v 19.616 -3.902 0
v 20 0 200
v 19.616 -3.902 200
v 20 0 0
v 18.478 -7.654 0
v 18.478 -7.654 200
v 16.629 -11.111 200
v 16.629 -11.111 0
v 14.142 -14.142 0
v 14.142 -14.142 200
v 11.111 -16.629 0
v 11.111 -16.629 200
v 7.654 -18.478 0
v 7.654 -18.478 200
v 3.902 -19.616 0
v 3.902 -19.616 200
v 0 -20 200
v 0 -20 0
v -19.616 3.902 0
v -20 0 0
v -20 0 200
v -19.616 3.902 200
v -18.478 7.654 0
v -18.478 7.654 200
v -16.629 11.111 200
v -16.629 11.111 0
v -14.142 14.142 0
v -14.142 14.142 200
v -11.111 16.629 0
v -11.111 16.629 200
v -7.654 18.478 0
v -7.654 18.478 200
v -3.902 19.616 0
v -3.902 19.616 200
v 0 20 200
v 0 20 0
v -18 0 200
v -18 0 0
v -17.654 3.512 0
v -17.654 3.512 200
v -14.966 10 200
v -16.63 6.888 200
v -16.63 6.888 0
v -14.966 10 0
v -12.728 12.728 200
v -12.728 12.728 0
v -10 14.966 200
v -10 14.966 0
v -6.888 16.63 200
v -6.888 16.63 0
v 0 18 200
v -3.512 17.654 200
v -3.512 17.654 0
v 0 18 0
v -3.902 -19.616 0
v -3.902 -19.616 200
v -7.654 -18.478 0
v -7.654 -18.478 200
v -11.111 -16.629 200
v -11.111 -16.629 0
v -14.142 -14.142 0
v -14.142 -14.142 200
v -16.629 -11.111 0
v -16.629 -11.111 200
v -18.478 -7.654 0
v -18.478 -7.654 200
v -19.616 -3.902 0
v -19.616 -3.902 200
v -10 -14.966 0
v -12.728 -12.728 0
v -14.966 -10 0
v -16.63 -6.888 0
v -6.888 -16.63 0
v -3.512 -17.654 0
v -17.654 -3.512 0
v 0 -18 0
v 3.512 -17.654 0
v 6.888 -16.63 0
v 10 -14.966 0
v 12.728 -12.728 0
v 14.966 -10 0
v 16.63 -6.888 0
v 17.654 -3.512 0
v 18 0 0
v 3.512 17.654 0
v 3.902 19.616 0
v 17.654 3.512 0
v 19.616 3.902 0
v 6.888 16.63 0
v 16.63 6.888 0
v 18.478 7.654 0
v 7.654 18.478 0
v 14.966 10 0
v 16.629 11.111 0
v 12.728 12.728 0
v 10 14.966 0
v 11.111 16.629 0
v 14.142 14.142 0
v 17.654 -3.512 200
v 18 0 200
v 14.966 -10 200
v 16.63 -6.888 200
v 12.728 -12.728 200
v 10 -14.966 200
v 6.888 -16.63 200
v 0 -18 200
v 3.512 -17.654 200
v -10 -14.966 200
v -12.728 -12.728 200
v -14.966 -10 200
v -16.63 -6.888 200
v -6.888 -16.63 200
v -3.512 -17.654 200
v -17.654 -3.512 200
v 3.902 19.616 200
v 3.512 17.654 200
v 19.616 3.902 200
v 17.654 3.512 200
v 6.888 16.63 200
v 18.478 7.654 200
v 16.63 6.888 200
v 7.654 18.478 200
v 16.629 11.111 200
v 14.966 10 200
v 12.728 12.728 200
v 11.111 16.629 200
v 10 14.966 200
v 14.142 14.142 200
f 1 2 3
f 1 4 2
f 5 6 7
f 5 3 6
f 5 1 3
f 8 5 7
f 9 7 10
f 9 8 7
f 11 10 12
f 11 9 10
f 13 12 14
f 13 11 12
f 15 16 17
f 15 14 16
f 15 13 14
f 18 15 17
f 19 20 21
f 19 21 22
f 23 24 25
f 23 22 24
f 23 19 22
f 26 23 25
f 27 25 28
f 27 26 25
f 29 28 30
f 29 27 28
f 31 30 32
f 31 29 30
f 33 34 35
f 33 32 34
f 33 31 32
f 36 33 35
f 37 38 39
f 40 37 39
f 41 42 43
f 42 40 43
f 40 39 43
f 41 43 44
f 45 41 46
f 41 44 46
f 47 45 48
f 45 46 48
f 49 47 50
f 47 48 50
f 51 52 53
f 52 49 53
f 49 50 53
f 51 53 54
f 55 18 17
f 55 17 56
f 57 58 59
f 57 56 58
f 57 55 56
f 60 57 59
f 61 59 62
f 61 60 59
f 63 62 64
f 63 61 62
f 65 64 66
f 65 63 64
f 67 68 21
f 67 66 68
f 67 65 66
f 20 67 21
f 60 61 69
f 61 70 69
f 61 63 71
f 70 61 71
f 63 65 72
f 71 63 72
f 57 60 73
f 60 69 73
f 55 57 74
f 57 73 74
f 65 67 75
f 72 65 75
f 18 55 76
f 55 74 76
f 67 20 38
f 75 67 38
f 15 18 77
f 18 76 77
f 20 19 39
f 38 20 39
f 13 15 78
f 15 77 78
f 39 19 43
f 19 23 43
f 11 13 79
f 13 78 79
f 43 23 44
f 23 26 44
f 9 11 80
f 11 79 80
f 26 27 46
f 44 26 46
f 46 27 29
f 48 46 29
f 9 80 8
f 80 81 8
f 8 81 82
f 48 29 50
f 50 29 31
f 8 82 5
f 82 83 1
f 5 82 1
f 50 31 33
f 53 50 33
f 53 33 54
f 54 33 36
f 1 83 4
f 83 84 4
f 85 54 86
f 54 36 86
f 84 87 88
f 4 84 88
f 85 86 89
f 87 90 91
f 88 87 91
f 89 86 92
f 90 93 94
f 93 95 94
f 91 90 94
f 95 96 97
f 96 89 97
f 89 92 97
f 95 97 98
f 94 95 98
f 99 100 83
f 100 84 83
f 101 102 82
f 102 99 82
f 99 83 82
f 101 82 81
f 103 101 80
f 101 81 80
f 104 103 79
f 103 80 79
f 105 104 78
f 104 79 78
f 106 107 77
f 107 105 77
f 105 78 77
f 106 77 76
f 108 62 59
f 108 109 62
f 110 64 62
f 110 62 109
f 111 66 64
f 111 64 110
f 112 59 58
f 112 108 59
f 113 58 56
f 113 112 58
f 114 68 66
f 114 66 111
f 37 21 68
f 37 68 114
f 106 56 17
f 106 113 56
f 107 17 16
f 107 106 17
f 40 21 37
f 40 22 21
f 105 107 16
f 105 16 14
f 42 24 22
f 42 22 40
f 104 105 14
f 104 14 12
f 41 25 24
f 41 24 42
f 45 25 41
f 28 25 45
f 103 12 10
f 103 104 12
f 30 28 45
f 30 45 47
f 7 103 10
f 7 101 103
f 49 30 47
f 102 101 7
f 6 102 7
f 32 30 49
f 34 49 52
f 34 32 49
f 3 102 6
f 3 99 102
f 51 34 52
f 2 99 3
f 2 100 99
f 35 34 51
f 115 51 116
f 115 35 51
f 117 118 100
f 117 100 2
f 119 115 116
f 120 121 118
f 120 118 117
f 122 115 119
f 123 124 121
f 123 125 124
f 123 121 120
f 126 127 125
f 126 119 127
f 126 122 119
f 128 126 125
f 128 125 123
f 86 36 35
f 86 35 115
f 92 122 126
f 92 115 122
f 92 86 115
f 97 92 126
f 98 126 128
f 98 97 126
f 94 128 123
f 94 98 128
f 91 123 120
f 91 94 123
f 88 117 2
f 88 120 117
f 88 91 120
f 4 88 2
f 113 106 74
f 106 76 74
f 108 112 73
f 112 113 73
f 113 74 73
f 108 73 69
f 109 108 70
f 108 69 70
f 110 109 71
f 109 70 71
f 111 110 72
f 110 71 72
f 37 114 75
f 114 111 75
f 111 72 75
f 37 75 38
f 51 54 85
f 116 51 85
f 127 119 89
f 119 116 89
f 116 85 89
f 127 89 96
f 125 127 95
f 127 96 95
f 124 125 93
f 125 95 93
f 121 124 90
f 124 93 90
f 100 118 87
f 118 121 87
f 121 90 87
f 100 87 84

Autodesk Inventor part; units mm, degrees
ref_plane "YZ Plane" through (0, 0, 0) normal (1, 0, 0) x (0, 1, 0)
ref_plane "XZ Plane" through (0, 0, 0) normal (0, 1, 0) x (-1, 0, 0)
ref_plane "XY Plane" through (0, 0, 0) normal (0, 0, 1) x (1, 0, 0)
sketch "스케치1" plane through (0, 0, 0) normal (0, 0, 1) x (1, 0, 0)
  line L0 (0, 20) -> (0, 20)
  line L1 (20, 0) -> (20, 0)
  line L2 (0, -20) -> (0, -20)
  line L3 (-20, 0) -> (-20, 0)
  line L4 (0, 18) -> (0, 18)
  line L5 (-18, 0) -> (-18, 0)
  line L6 (0, -18) -> (0, -18)
  line L7 (18, 0) -> (18, 0)
  arc A0 (0, 18) -> (-18, 0) centre (0, 0) ccw
  arc A1 (-18, 0) -> (0, -18) centre (0, 0) ccw
  arc A2 (0, -18) -> (18, 0) centre (0, 0) ccw
  arc A3 (18, 0) -> (0, 18) centre (0, 0) ccw
  arc A4 (0, 20) -> (-20, 0) centre (0, 0) ccw
  arc A5 (-20, 0) -> (0, -20) centre (0, 0) ccw
  arc A6 (0, -20) -> (20, 0) centre (0, 0) ccw
  arc A7 (20, 0) -> (0, 20) centre (0, 0) ccw
  point P0 (0, 0)
  point P1 (-20, 20)
  point P2 (20, -20)
  point P3 (20, 20)
  point P4 (-20, -20)
  point P5 (18, 18)
  point P6 (-18, 18)
  point P7 (-18, -18)
  point P8 (18, -18)
  dimension "d0" = 40
  dimension "d1" = 40
  dimension "d2" = 20
  dimension "d3" = 20
  dimension "d4" = 2
  dimension "d7" = 18
  dimension "d8" = 18
  dimension "d9" = 18
  dimension "d10" = 18
  dimension "d11" = 20
extrude "돌출1" add sketch "스케치1" along normal blind 200
equation "\"d2\" = 0.5 * d1"
equation "\"d3\" = 0.5 * d0"
properties part number "링크2_240mm" material "CFRP"
